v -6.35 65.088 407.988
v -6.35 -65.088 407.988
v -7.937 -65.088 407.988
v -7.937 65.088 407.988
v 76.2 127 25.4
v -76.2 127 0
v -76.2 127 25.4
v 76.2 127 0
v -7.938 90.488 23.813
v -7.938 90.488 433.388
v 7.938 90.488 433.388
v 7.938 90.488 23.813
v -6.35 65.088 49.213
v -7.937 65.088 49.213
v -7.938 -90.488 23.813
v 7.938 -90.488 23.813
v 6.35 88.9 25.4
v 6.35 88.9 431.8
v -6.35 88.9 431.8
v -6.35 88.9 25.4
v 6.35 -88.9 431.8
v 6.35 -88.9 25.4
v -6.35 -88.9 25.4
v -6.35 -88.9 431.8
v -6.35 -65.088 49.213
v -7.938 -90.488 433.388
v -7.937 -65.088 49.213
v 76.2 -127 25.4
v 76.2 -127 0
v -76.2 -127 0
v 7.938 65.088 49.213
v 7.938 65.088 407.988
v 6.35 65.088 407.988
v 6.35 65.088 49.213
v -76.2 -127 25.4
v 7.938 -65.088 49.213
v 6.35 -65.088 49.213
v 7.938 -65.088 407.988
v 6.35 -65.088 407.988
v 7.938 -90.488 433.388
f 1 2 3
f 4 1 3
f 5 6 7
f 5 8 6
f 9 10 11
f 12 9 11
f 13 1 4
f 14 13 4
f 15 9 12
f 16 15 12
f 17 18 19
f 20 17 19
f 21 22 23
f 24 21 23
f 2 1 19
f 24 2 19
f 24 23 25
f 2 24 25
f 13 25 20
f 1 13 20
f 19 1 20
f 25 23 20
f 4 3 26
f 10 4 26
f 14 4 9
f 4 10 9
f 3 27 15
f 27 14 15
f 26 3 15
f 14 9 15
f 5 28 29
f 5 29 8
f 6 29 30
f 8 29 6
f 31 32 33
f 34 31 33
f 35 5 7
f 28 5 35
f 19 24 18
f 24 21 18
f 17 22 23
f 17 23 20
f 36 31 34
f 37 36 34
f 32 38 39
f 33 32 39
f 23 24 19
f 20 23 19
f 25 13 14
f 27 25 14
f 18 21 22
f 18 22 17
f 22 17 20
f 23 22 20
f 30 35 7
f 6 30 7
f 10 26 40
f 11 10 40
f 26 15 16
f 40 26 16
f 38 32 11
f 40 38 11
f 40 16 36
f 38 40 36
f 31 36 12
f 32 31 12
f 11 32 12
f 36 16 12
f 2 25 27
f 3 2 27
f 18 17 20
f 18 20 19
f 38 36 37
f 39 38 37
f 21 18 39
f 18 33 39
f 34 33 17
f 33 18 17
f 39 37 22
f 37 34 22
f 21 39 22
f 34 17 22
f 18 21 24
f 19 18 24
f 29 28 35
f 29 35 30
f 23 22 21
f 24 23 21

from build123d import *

# Parameters (mm, degrees)
F0_W     = 177.8
F0_H     = 406.4
F1_DEPTH = 6.35
F2_DEPTH = 76.2


with BuildPart() as f1:
    # F0 (on Right) → F1 (new body, symmetric)
    with BuildSketch(Plane.YZ):
        with Locations((0, 228.6)):
            Rectangle(F0_W, F0_H)
    extrude(amount=F1_DEPTH, both=True)


with BuildPart() as f2:
    # F0 (on Right) → F2 (new body, symmetric)
    with BuildSketch(Plane.YZ):
        Polygon((127, 25.4), (88.9, 25.4), (-88.9, 25.4), (-127, 25.4), (-127, 0), (127, 0), align=None)
    extrude(amount=F2_DEPTH, both=True)


with BuildPart() as f4:
    # F4: sweep along a path in F4_path
    with BuildLine(Plane(origin=(6.35, -88.9, 431.8), x_dir=(0, 0, -1), z_dir=(-1, 0, 0))) as f4_path:
        Line((0, 0), (406.4, 0))
        Line((406.4, 0), (406.4, -177.8))
        Line((406.4, -177.8), (0, -177.8))
        Line((0, -177.8), (0, 0))
    # F3 (on face) → F4 (sweep)
    with BuildSketch(Plane.XY.offset(25.4)):
        Polygon((6.35, -88.9), (-6.35, -88.9), (-6.35, -65.0875), (-7.9375, -65.0875), (-7.9375, -90.4875), (7.9375, -90.4875), (7.9375, -65.0875), (6.35, -65.0875), align=None)
    sweep(path=f4_path.line, transition=Transition.RIGHT)


solid = Compound([f1.part, f2.part, f4.part])
